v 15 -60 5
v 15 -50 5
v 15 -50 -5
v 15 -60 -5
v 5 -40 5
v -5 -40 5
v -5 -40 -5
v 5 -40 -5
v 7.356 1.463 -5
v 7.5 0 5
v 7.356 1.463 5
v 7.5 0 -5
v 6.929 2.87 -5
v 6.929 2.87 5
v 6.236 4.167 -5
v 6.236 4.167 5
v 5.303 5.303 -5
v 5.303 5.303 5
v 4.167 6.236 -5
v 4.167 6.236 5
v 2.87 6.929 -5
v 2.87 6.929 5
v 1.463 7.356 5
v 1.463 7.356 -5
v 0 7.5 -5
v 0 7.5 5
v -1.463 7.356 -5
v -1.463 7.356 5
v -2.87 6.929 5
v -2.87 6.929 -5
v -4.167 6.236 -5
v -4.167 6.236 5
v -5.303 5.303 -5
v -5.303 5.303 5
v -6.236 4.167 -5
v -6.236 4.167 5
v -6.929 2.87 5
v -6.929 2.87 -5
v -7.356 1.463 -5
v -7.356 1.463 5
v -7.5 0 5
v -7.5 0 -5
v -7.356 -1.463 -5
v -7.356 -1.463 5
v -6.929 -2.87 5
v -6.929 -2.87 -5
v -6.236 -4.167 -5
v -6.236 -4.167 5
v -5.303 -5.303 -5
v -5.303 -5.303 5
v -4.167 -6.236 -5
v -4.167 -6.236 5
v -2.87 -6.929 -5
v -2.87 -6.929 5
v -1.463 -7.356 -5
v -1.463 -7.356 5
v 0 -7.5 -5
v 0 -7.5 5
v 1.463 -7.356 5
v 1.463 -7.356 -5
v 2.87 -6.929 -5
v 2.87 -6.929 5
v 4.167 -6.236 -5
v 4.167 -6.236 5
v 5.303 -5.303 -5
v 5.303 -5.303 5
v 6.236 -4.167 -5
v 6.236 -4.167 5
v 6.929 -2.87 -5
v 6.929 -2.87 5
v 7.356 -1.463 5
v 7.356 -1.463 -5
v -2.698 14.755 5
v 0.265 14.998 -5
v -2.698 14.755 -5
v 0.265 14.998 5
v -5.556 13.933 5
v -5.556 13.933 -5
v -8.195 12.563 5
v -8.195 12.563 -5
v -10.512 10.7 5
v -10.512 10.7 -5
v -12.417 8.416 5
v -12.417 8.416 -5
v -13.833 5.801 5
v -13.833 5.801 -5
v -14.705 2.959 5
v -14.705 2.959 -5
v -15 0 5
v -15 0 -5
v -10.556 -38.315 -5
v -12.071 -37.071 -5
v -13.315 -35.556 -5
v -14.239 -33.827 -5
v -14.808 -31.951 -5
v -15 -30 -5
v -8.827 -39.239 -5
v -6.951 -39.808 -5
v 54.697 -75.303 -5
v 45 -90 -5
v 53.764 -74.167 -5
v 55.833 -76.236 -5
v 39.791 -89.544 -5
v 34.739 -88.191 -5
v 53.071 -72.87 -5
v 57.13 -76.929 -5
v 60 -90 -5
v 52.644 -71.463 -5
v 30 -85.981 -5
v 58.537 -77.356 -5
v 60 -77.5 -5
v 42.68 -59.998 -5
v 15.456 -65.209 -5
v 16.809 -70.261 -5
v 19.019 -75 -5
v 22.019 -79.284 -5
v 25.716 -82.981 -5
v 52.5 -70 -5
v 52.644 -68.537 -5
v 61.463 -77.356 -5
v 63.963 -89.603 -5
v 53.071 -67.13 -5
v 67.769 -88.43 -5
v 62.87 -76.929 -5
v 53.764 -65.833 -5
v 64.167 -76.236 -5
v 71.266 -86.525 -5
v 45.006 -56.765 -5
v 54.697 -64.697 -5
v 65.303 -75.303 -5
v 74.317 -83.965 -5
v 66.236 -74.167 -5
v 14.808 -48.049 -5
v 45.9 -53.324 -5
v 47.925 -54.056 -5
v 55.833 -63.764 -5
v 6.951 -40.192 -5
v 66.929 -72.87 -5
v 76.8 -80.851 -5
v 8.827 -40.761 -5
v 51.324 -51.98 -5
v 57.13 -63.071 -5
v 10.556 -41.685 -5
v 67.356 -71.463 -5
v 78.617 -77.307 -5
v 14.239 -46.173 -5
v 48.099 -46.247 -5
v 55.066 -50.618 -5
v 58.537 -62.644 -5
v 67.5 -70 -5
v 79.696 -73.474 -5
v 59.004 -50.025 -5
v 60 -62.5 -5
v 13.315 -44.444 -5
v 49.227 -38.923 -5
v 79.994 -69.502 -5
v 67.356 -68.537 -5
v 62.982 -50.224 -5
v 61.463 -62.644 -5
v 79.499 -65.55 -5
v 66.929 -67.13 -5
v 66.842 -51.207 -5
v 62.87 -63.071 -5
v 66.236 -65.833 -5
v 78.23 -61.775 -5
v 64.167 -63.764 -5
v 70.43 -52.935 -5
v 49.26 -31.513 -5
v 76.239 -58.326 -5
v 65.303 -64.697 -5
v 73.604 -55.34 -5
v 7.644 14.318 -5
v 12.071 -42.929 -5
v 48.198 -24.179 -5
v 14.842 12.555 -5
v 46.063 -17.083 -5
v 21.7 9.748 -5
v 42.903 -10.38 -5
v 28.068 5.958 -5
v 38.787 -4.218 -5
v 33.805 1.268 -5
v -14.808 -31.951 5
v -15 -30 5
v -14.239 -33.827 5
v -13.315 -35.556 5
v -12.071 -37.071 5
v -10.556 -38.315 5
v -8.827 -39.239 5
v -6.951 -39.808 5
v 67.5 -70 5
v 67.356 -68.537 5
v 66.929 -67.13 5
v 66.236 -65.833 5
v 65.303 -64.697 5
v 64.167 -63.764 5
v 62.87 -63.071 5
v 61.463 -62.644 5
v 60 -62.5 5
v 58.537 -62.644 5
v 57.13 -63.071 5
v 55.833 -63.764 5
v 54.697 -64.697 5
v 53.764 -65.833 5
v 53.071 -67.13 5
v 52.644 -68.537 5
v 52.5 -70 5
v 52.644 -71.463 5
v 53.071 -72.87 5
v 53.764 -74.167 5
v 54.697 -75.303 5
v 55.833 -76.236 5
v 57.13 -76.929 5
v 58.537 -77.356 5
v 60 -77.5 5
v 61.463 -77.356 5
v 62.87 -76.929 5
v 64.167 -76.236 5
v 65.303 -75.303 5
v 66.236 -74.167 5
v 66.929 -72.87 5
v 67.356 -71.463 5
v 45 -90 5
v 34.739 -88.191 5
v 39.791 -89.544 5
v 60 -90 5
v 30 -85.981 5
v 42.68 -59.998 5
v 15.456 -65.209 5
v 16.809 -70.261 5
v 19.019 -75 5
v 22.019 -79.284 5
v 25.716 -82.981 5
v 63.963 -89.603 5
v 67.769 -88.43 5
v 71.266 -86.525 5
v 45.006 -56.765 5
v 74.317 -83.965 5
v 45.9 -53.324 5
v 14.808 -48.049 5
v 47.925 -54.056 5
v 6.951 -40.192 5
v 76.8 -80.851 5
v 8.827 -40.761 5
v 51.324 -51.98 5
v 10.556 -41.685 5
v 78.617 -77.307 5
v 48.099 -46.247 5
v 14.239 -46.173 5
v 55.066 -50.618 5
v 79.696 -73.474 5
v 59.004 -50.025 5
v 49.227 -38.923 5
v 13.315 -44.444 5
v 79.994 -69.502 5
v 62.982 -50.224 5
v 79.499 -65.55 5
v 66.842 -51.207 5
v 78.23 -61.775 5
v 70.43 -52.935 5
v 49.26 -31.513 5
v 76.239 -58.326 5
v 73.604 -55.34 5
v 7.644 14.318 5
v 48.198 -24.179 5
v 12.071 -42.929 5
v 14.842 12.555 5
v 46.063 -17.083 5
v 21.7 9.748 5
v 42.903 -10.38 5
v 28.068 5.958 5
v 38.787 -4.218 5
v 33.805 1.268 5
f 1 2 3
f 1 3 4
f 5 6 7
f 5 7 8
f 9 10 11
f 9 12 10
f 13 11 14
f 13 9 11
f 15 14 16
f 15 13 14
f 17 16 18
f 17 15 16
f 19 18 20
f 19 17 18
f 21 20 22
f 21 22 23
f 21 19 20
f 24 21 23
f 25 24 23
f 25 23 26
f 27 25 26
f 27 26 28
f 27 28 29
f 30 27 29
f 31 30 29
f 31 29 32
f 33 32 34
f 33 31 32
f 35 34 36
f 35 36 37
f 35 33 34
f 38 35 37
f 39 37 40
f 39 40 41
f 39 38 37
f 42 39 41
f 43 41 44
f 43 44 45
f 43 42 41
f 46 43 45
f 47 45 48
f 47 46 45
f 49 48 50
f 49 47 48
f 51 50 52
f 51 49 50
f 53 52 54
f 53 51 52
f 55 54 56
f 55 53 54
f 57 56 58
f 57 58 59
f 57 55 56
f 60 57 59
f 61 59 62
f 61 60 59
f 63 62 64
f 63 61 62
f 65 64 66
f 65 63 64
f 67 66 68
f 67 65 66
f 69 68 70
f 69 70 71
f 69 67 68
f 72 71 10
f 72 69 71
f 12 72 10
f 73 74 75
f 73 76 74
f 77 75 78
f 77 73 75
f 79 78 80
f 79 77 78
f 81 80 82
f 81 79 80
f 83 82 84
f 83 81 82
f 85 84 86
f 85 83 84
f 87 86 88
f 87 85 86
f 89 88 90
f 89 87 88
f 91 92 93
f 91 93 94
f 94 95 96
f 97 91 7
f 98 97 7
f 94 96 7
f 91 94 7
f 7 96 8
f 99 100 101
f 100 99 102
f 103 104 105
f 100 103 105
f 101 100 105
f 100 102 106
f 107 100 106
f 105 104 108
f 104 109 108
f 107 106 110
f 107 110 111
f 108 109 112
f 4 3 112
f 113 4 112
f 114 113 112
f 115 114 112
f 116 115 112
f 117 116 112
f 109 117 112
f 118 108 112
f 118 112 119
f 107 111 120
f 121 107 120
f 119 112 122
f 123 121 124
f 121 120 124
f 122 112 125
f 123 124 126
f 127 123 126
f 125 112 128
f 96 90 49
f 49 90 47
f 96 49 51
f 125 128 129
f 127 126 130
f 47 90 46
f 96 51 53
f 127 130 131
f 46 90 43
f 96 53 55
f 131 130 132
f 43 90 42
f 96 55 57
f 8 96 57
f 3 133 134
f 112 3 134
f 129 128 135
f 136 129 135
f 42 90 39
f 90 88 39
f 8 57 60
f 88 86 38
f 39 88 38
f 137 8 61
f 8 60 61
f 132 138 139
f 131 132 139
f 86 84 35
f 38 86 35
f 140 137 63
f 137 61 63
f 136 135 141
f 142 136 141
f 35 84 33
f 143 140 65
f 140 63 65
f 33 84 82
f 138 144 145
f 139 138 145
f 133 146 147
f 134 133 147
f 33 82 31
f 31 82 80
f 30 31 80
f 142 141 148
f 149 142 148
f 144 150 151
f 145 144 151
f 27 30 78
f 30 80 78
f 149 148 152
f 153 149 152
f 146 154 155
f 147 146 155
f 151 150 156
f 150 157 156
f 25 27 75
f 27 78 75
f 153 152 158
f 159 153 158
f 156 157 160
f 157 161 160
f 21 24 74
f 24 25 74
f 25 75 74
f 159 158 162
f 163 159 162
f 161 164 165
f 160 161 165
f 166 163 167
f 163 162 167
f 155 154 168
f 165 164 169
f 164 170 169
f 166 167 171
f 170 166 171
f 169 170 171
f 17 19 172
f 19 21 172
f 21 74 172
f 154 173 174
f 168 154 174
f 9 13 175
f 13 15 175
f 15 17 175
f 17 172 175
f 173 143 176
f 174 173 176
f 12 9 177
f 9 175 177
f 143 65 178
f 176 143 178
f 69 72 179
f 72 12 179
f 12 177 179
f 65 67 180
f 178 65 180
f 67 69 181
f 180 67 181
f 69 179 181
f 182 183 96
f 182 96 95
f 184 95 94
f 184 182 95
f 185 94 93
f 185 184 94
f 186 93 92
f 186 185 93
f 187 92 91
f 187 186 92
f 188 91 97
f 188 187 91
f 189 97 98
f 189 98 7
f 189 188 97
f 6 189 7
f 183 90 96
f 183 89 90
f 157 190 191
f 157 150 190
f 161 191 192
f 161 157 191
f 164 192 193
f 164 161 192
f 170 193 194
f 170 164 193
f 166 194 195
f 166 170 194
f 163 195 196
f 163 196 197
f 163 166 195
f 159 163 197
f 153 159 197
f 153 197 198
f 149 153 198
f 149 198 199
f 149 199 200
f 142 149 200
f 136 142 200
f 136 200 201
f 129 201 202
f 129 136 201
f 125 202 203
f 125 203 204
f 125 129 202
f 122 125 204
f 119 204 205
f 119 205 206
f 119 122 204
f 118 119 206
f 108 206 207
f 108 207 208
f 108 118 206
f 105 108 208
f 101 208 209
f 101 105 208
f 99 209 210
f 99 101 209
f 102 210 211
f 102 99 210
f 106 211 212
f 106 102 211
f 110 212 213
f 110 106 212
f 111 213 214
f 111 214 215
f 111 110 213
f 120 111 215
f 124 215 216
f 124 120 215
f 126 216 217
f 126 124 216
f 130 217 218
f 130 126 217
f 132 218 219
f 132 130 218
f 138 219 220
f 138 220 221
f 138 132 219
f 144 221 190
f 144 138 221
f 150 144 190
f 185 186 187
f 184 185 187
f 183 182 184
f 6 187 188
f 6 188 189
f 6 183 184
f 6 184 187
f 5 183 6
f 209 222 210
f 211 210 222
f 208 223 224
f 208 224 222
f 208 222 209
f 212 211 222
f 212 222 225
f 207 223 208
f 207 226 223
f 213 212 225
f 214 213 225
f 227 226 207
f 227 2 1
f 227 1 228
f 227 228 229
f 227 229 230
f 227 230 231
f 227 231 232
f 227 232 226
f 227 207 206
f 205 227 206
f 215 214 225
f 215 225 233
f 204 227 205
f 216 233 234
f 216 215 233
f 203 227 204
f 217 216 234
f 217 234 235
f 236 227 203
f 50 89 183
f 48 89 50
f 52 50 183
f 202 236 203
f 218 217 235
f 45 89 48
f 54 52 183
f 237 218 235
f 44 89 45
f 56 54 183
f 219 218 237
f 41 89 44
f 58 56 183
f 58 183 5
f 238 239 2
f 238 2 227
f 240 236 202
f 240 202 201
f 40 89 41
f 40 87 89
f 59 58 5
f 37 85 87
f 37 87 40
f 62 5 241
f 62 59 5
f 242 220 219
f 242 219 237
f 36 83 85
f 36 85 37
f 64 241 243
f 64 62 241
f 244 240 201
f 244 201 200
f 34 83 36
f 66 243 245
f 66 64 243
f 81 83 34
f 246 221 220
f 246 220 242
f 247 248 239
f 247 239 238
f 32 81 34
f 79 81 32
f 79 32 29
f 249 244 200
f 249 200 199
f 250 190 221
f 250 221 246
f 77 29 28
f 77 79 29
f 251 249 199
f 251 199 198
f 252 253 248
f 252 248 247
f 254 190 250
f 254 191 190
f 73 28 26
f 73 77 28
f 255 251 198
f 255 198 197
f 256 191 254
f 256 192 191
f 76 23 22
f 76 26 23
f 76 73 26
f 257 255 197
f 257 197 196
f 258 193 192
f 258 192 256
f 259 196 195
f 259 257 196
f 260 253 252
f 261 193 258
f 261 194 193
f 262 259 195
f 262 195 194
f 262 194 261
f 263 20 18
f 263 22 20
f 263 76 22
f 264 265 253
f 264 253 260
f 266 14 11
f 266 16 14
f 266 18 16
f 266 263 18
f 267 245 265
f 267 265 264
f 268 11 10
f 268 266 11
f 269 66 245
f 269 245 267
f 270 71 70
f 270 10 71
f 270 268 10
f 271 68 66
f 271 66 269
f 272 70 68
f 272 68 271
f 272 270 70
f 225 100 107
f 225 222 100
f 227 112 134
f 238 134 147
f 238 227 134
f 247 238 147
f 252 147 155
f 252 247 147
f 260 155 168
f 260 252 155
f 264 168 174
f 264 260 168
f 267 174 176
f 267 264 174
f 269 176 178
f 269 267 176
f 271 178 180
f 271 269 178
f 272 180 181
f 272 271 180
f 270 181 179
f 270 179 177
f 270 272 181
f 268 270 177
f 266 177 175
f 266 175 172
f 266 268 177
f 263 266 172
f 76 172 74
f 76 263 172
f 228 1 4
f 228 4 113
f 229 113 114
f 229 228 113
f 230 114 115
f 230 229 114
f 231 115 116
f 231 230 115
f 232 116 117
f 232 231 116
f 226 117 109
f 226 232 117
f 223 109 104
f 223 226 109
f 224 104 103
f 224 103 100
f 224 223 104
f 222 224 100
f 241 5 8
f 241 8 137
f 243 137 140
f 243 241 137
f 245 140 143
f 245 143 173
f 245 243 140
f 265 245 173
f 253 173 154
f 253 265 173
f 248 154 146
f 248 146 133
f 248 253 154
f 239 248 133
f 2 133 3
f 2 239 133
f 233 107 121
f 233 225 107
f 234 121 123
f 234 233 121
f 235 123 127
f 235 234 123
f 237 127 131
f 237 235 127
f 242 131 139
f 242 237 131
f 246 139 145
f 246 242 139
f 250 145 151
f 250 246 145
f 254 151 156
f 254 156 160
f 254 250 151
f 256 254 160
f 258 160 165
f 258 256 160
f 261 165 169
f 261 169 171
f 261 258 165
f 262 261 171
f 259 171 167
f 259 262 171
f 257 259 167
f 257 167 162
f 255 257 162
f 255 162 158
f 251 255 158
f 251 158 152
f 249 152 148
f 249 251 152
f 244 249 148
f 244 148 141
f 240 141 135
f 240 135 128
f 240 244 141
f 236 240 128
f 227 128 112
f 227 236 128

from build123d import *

# Parameters (mm, degrees)
SKETCH1_R           = 7.5
BOSS_EXTRUDE1_DEPTH = 5


with BuildPart() as part:
    # Sketch1 → Boss-Extrude1 (new body, symmetric)
    with BuildSketch(Plane.XY):
        with BuildLine():
            Line((-15, 0), (-15, -30))
            ThreePointArc((-15, -30), (-12.071067812, -37.071067812), (-5, -40))
            Line((-5, -40), (5, -40))
            ThreePointArc((5, -40), (12.071067812, -42.928932188), (15, -50))
            Line((15, -50), (15, -60))
            ThreePointArc((15, -60), (23.786796564, -81.213203436), (45, -90))
            Line((45, -90), (60, -90))
            ThreePointArc((60, -90), (77.320959018, -60.000781096), (42.680393915, -59.998437869))
            ThreePointArc((42.680393915, -59.998437869), (42.903012663, -10.380159149), (0.265123413, 14.997656803))
            ThreePointArc((0.265123413, 14.997656803), (-10.512448545, 10.699926429), (-15, 0))
        make_face()
        Circle(SKETCH1_R, mode=Mode.SUBTRACT)
        with Locations((60, -70)):
            Circle(SKETCH1_R, mode=Mode.SUBTRACT)
    extrude(amount=BOSS_EXTRUDE1_DEPTH, both=True)


solid = part.part
